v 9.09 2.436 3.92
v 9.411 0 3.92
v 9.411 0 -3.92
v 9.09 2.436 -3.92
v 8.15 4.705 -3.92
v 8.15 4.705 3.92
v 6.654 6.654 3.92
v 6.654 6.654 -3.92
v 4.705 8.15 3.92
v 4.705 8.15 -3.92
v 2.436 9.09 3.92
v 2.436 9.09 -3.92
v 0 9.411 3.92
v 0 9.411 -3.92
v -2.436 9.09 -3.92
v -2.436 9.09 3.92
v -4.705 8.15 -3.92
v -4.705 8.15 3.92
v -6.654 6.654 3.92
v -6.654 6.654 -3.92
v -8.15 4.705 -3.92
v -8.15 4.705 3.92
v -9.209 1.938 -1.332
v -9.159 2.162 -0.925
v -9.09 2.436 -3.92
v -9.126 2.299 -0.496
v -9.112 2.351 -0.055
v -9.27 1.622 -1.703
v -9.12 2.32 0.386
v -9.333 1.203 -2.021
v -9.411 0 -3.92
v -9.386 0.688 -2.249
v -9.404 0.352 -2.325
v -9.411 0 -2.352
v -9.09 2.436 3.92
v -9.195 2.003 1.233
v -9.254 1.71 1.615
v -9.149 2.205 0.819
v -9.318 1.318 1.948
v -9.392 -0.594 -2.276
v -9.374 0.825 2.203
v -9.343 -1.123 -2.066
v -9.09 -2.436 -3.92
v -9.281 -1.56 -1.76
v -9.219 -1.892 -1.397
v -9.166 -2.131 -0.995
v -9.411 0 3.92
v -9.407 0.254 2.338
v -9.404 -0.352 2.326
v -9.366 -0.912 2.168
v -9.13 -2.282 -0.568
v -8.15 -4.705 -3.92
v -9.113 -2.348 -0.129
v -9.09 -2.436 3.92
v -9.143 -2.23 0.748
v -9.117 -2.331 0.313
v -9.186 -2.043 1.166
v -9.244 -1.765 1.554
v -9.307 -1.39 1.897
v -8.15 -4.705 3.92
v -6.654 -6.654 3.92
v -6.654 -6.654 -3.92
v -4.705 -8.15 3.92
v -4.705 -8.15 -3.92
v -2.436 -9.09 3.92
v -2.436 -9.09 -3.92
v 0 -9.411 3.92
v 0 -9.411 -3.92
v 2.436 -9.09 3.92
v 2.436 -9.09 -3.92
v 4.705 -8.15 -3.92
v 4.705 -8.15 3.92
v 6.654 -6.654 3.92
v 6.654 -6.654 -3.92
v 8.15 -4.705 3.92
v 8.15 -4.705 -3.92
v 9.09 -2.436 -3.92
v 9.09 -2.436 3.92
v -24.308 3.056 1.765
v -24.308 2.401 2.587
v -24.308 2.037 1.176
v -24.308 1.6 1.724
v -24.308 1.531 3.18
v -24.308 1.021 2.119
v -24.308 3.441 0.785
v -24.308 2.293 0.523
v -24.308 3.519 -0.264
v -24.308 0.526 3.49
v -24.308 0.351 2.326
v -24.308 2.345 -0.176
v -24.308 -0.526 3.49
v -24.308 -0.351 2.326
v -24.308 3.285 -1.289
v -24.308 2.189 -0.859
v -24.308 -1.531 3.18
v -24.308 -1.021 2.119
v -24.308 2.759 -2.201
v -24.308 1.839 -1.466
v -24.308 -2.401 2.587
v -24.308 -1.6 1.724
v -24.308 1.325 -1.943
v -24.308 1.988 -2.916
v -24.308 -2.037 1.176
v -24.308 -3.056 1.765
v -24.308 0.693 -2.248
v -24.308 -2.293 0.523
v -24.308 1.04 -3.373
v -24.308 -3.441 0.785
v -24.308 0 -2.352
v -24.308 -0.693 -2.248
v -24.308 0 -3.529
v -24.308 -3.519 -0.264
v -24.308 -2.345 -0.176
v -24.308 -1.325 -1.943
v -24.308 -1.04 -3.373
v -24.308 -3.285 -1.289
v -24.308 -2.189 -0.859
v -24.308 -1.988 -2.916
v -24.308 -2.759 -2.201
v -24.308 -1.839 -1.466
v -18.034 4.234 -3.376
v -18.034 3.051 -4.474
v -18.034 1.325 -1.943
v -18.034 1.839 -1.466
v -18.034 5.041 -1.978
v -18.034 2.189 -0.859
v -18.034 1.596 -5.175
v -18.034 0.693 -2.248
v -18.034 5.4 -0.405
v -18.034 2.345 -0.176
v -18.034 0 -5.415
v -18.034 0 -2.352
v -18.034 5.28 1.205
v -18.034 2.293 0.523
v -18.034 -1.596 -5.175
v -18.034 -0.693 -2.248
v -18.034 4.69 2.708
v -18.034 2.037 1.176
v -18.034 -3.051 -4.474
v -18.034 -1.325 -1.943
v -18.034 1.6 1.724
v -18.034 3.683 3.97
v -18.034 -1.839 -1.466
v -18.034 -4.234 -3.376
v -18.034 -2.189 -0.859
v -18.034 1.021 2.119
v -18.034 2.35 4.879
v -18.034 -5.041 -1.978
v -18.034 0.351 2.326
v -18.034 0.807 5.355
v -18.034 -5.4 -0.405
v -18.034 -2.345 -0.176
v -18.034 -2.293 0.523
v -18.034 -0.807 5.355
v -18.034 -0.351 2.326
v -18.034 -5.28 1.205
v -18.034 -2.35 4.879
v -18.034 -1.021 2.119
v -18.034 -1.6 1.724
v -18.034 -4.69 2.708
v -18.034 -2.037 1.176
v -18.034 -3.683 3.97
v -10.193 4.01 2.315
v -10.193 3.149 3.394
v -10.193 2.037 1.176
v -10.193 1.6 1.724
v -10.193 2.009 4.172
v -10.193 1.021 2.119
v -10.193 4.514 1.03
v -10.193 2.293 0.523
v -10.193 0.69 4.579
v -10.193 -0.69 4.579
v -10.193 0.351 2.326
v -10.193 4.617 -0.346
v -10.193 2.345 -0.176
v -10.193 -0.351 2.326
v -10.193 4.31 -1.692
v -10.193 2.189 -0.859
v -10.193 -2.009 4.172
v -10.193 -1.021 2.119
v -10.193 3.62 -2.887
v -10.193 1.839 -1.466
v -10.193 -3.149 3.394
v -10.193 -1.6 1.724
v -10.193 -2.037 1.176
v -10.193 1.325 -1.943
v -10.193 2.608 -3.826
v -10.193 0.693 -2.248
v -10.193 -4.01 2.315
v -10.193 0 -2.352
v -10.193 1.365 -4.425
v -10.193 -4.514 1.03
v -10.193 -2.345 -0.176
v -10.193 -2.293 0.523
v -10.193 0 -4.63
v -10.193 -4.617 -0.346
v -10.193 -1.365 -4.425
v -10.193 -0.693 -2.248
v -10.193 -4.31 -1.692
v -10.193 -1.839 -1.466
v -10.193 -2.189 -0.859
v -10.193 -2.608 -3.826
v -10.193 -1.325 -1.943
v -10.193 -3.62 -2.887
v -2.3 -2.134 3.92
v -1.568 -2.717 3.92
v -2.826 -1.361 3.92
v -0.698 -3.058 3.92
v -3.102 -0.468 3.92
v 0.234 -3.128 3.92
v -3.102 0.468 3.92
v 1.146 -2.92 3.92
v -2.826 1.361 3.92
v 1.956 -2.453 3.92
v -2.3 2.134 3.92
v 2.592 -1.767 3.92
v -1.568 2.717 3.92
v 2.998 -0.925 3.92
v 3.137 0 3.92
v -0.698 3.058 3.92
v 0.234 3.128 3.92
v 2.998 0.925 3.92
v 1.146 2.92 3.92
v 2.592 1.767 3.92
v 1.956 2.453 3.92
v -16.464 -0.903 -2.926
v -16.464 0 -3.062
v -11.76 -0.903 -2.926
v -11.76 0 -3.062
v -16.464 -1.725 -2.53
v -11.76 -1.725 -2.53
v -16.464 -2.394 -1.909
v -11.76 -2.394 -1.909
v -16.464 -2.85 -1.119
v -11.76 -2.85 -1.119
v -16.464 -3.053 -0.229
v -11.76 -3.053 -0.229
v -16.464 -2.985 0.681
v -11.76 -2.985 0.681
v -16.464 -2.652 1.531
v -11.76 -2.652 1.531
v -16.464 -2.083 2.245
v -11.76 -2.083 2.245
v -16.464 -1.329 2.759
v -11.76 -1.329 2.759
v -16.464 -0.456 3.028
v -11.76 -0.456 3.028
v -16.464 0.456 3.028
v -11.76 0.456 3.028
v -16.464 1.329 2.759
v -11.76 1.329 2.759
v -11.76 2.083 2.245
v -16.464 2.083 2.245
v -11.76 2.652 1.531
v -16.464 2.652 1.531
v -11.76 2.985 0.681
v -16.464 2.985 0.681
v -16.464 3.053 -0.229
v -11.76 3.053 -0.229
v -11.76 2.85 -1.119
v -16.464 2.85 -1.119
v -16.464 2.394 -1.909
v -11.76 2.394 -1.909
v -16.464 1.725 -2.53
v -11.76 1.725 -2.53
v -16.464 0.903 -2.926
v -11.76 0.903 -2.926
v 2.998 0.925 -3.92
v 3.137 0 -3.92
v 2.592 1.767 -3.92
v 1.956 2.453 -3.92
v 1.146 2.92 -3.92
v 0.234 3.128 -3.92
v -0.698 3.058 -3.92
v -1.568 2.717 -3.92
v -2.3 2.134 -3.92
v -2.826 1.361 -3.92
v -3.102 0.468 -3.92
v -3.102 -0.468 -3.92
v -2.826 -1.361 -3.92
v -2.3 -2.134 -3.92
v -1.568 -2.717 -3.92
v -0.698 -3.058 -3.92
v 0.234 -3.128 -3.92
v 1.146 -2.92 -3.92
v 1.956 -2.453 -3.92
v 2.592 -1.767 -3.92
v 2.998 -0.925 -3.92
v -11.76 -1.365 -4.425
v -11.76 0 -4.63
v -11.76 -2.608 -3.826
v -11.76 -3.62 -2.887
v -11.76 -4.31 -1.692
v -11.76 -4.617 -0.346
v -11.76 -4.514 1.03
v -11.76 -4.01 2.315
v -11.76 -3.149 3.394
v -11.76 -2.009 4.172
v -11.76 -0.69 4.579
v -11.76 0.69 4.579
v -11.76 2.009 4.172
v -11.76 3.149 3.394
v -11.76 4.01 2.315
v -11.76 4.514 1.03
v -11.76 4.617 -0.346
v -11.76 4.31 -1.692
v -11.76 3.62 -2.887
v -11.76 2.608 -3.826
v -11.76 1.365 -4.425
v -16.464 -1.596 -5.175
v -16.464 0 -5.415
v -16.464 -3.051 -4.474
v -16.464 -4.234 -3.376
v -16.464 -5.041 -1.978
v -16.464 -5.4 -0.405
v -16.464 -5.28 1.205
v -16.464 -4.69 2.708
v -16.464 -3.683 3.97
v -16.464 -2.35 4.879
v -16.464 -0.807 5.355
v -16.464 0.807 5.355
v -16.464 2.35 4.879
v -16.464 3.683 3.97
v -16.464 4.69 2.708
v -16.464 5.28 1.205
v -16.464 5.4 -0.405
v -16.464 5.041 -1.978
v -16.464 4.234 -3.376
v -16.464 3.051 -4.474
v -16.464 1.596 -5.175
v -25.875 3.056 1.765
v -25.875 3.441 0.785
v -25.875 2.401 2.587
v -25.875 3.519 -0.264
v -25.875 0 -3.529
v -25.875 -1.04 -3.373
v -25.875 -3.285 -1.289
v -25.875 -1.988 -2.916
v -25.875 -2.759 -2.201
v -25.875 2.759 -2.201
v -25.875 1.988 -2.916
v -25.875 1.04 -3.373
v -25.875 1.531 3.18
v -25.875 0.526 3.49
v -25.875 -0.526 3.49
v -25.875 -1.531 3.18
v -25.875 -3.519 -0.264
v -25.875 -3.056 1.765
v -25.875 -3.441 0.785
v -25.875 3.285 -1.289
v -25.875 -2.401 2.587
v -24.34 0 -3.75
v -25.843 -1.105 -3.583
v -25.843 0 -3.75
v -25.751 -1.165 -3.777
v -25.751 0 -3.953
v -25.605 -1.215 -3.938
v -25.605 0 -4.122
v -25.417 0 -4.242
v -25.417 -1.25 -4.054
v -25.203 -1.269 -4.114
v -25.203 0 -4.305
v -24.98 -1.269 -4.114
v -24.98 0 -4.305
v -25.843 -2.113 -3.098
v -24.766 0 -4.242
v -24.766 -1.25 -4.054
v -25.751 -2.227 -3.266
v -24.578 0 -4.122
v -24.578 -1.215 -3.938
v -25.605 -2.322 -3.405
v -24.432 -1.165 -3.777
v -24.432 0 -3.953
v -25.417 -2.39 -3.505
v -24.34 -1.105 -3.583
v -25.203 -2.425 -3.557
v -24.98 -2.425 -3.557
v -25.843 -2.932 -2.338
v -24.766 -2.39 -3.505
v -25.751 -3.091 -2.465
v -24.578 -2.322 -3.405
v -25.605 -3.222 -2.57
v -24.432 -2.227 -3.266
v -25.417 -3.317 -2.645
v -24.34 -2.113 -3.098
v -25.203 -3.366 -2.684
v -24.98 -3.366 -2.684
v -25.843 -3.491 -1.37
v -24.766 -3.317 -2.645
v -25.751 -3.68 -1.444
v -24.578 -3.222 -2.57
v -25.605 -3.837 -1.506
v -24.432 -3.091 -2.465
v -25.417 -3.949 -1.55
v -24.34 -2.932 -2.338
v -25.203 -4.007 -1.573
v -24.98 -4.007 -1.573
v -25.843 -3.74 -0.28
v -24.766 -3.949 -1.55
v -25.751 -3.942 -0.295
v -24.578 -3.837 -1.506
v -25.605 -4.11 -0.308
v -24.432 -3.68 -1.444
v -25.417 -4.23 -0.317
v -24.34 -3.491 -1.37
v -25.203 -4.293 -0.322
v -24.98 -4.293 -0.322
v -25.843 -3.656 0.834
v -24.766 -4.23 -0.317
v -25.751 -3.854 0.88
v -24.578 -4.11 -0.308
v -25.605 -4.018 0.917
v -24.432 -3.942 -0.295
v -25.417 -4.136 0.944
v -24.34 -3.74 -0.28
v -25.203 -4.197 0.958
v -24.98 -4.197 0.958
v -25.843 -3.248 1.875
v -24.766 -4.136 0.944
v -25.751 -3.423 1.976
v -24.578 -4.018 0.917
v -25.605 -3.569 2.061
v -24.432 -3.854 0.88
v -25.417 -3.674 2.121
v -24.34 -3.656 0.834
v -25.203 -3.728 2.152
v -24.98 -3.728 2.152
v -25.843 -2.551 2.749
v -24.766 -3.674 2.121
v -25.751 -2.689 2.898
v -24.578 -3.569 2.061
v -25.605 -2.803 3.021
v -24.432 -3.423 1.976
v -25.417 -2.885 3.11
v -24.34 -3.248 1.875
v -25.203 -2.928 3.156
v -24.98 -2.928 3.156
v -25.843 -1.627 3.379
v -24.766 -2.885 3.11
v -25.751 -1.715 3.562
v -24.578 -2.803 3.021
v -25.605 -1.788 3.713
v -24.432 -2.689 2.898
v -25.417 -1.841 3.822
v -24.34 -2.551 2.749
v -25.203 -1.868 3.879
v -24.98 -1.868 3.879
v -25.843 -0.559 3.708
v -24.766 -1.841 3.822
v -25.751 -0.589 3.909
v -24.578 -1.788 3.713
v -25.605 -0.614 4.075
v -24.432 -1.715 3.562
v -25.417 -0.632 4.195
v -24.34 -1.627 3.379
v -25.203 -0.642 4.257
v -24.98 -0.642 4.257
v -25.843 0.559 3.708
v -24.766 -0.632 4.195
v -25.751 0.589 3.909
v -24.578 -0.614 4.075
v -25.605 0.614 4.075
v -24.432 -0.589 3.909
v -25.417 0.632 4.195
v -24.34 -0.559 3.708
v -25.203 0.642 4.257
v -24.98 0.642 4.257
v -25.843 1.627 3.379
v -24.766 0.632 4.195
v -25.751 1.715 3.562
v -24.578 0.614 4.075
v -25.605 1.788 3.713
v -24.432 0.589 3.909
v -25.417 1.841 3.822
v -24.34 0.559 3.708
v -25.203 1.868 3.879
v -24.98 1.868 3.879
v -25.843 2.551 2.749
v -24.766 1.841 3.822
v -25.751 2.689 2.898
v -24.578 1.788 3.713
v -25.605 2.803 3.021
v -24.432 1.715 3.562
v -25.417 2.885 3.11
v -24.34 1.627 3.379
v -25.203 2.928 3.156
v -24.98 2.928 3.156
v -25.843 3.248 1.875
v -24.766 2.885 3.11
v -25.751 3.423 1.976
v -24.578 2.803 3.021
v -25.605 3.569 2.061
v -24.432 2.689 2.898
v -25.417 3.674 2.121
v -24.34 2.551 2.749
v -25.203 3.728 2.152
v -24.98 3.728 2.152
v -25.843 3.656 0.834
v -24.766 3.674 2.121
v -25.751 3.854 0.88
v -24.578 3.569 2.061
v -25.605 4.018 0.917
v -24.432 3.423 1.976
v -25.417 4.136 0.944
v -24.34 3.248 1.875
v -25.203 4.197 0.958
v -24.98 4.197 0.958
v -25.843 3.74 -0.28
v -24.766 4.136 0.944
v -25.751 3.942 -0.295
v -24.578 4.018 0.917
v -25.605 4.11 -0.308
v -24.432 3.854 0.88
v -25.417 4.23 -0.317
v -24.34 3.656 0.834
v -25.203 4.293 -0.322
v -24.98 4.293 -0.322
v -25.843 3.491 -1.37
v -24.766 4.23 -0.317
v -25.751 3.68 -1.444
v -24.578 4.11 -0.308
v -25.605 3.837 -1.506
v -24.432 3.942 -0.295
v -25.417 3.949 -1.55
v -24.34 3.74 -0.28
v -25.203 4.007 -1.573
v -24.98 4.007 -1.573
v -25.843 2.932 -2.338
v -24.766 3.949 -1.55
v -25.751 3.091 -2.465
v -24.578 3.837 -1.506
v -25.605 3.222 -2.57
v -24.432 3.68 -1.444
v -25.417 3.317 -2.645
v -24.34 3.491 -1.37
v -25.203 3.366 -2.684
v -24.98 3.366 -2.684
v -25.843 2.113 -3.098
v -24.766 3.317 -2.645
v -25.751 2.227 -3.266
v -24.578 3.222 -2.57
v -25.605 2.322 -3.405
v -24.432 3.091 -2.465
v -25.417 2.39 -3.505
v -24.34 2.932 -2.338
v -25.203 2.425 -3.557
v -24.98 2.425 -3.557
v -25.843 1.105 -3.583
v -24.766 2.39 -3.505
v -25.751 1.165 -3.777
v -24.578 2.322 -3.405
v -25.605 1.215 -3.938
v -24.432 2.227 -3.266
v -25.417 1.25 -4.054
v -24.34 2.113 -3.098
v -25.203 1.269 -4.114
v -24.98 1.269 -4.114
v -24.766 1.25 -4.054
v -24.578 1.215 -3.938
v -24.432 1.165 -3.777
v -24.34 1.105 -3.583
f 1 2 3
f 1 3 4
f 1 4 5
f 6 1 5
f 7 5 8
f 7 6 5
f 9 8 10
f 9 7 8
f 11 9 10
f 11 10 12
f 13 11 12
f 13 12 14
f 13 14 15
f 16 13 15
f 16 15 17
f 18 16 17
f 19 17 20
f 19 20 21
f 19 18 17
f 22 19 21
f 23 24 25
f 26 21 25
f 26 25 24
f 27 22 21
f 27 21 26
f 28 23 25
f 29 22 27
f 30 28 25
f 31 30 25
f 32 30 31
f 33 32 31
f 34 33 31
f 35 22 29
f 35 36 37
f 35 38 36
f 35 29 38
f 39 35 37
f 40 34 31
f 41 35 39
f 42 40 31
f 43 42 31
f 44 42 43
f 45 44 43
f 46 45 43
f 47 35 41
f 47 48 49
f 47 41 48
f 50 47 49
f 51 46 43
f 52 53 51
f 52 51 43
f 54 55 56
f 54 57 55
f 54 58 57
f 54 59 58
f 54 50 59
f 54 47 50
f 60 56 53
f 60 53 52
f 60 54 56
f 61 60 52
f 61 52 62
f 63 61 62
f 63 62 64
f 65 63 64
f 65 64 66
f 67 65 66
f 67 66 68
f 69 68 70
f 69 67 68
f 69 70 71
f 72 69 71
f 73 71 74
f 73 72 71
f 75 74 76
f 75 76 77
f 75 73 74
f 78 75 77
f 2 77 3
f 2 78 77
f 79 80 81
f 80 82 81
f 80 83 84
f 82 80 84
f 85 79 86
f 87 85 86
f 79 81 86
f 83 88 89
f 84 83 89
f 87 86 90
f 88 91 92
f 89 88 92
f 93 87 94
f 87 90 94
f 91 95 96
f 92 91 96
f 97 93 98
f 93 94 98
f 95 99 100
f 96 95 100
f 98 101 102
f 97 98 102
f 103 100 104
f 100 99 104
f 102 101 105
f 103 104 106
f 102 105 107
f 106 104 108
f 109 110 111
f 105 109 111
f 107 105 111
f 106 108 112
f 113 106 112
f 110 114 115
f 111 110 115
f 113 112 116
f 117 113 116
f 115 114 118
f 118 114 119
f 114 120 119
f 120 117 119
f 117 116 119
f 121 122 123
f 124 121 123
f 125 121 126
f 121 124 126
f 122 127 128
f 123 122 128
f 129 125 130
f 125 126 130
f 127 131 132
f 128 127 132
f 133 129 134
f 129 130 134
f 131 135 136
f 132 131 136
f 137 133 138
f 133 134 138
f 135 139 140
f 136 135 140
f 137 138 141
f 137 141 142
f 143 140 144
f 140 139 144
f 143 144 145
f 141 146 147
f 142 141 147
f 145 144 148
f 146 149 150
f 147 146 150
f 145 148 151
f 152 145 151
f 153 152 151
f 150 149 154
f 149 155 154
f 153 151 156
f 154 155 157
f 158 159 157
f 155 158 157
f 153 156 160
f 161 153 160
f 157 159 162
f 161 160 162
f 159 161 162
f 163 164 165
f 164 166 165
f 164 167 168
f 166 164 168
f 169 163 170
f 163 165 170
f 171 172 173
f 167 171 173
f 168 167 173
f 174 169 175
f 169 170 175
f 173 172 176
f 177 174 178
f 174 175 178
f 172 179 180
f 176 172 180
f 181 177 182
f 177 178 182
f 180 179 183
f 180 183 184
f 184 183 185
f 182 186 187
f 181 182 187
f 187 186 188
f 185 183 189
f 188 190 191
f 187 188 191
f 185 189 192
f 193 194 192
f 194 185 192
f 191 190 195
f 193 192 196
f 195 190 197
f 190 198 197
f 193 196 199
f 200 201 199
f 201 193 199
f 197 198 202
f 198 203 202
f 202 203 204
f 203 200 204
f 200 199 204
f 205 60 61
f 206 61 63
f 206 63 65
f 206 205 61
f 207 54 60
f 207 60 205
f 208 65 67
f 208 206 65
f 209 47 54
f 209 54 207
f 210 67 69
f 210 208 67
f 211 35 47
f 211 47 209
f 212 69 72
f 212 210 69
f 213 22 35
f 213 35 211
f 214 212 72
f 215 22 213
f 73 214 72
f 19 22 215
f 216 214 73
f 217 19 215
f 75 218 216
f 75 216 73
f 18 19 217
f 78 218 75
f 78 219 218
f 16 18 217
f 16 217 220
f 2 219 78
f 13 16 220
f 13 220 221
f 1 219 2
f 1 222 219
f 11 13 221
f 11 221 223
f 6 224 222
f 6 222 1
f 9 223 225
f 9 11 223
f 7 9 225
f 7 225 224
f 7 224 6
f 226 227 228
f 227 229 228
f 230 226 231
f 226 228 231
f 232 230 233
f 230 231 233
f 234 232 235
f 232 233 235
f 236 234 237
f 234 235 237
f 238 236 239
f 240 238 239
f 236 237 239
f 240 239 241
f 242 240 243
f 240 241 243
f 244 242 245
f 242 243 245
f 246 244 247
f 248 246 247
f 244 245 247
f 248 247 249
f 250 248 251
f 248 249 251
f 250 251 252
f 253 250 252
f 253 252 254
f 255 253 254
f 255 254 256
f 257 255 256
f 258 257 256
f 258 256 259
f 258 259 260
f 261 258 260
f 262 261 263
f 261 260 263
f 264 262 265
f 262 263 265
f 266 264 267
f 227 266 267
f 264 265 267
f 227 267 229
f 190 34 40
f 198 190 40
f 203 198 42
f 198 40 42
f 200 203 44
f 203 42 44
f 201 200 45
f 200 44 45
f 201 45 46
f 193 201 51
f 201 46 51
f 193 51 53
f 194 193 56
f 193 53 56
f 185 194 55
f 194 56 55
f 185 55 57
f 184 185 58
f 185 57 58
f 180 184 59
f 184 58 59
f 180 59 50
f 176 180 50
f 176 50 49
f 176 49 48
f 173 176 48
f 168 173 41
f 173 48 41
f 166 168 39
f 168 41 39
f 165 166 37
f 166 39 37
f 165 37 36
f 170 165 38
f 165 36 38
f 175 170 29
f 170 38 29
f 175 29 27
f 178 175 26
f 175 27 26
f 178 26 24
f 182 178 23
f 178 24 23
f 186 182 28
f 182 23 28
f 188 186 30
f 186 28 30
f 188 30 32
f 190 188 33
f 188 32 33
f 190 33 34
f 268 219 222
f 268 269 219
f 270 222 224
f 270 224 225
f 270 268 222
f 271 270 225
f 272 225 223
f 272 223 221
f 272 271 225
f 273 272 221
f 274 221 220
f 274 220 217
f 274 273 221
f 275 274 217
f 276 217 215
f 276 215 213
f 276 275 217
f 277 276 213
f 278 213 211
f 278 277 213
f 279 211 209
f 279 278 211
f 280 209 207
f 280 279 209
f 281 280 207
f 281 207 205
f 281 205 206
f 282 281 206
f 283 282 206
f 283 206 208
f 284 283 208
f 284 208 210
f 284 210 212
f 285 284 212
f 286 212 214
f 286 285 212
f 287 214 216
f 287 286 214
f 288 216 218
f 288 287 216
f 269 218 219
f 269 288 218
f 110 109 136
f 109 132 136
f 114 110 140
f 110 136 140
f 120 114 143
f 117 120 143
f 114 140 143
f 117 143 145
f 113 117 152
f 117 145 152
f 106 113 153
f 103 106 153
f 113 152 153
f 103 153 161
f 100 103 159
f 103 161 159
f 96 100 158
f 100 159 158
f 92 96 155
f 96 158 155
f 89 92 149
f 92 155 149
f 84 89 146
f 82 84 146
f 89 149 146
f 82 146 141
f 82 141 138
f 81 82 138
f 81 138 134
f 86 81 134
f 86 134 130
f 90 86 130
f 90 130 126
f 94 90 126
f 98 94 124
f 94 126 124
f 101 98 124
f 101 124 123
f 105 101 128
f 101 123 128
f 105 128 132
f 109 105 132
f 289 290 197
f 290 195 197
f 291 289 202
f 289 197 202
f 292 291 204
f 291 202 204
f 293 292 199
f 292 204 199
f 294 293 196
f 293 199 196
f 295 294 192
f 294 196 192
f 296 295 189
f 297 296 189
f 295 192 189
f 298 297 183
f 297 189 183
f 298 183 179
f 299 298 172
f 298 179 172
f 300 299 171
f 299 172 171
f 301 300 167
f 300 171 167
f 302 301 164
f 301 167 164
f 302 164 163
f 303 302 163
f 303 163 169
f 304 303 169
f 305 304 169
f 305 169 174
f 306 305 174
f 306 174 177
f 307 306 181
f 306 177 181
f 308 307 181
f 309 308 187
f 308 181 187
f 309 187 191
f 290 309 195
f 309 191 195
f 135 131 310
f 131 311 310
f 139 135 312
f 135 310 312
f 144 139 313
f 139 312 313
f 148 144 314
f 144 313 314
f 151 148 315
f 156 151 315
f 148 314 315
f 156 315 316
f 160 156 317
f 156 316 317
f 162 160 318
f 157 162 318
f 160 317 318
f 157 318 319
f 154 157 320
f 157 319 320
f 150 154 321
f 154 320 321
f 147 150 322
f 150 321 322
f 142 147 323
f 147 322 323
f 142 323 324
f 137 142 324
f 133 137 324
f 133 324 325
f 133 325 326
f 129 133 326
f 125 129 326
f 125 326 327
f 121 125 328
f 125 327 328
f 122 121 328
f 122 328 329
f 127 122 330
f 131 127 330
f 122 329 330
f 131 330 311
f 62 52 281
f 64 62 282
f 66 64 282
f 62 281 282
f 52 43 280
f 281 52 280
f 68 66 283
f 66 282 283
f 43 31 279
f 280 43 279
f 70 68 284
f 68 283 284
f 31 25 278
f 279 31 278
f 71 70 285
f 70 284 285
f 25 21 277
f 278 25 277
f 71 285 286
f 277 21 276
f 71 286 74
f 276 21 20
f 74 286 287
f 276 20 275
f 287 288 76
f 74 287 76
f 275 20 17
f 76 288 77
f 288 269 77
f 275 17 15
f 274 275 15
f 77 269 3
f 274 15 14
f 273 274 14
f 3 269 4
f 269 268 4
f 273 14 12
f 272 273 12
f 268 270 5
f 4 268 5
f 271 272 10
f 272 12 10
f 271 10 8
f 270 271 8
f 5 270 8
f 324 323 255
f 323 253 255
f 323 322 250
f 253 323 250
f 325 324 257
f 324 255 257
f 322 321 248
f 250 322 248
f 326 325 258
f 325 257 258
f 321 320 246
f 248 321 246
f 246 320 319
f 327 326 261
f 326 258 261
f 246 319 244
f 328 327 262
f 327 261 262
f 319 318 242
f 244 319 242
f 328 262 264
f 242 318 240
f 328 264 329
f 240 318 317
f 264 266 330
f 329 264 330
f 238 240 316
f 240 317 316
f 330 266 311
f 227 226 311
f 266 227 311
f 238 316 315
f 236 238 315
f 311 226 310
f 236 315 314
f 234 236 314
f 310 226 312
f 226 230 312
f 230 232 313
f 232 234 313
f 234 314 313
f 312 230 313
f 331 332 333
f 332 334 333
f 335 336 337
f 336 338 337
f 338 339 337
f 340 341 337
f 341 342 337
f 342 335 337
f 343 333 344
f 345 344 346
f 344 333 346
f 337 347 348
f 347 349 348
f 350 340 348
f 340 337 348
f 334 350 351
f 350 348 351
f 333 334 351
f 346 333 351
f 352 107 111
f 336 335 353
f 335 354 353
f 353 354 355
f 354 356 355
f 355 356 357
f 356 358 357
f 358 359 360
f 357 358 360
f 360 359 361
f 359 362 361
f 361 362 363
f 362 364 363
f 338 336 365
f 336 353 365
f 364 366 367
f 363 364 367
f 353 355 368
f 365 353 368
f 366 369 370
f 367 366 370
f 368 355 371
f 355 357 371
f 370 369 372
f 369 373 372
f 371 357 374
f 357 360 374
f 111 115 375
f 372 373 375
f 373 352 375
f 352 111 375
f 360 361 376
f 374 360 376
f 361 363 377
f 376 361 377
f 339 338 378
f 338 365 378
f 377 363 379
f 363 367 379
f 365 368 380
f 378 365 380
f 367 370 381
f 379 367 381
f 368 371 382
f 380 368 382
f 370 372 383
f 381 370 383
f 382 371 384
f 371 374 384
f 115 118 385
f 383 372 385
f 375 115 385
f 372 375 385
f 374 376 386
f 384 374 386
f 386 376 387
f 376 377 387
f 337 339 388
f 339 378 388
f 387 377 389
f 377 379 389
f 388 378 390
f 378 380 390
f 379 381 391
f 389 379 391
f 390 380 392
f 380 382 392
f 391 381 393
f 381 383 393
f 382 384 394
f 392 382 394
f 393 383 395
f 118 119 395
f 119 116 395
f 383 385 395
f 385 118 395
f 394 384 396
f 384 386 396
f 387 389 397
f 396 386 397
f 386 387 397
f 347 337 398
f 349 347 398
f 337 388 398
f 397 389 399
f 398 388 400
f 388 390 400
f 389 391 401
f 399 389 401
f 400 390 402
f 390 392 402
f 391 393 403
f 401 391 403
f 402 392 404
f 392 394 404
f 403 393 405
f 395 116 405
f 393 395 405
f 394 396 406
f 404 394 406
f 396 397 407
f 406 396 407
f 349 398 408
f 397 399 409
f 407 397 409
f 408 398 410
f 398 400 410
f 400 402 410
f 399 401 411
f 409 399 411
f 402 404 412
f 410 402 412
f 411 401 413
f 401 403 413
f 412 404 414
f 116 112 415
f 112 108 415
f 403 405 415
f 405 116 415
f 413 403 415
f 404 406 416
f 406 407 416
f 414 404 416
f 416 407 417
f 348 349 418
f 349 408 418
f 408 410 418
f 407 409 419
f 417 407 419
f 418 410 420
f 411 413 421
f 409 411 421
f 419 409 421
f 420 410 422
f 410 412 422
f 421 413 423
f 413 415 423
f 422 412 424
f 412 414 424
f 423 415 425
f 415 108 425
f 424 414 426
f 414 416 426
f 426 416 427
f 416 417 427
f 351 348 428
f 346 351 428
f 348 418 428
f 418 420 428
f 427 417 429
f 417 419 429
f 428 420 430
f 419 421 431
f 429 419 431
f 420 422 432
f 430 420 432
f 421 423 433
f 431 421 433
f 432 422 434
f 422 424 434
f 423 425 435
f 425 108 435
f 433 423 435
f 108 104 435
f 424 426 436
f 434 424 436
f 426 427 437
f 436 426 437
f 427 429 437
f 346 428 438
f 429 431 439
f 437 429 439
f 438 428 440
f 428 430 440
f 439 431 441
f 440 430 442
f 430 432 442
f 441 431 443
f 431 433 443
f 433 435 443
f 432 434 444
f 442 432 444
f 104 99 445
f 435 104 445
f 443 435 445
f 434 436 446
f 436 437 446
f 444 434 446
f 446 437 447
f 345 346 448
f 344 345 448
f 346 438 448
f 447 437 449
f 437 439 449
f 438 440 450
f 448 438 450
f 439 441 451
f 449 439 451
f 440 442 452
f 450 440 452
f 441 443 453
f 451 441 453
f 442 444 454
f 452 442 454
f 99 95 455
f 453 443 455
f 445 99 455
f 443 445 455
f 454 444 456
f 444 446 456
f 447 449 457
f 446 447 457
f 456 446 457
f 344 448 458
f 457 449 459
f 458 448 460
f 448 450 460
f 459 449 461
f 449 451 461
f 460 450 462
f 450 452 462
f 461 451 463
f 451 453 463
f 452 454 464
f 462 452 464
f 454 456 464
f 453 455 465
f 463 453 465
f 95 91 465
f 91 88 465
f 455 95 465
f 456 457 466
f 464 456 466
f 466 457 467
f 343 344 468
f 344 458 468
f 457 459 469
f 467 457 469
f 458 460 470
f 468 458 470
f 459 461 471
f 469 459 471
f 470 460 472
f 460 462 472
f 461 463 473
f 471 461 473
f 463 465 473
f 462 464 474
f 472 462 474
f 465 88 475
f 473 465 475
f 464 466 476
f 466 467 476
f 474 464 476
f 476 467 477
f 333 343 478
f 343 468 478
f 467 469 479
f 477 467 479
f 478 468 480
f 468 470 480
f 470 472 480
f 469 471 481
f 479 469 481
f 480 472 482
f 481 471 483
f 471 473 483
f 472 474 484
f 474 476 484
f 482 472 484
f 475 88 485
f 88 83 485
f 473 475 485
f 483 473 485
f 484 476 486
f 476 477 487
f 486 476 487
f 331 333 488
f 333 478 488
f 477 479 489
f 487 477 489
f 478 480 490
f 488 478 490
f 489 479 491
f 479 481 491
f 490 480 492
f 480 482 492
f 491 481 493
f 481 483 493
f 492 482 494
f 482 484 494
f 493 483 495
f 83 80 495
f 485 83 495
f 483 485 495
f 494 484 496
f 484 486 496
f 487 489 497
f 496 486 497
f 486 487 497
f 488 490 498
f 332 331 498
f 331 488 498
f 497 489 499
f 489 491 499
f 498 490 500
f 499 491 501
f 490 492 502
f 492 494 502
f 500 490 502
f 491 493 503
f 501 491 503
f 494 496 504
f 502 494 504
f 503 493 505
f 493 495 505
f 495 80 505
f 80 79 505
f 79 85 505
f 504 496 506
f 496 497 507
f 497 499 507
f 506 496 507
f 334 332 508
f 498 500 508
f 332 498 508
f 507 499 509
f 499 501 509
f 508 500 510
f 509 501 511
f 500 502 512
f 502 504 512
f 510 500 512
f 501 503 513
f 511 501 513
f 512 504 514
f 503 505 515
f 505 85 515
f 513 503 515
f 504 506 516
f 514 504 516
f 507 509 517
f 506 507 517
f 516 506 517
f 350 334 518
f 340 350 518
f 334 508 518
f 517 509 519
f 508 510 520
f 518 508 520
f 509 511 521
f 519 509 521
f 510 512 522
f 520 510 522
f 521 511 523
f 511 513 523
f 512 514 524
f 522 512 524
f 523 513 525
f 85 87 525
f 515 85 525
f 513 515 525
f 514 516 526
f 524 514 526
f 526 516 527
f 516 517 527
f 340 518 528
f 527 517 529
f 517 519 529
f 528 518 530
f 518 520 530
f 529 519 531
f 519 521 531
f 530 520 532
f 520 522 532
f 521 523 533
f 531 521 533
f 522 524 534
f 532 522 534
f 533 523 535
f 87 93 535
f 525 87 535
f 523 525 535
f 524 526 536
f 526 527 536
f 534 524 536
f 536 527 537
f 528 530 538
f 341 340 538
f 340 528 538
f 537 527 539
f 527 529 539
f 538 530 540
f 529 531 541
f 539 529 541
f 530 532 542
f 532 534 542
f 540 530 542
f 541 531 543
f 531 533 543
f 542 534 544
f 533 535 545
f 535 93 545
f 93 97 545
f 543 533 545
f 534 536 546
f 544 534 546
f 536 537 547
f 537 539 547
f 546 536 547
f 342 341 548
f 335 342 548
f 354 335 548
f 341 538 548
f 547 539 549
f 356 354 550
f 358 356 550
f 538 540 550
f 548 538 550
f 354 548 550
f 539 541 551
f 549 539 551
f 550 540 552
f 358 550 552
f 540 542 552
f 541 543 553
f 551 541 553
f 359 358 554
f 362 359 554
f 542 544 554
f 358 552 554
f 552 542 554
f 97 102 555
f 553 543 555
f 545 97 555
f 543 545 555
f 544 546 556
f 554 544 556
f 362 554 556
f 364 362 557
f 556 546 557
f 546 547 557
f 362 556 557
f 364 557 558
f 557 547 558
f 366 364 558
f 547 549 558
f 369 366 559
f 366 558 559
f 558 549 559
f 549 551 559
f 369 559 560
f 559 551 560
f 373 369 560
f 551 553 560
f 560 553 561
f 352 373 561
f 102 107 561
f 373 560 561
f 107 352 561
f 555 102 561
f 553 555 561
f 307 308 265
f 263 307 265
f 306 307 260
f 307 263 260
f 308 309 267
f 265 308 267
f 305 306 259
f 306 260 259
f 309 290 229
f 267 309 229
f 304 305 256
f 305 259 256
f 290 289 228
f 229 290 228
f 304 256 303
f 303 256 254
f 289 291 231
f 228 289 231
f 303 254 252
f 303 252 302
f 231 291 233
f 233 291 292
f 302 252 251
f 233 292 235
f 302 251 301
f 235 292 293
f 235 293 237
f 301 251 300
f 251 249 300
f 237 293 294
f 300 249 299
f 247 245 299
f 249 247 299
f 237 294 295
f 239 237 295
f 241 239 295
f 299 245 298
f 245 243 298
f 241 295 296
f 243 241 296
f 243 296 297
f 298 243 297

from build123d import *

# Parameters (mm, degrees)
SKETCH1_R                = 9.4107
SKETCH1_R_2              = 3.1369
BOSS_EXTRUDE1_DEPTH      = 3.92049
BOSS_EXTRUDE1_DEPTH_BACK = 3.92049


with BuildPart() as part:
    # Sketch1 → Boss-Extrude1 (new body, two sides)
    with BuildSketch(Plane.XY) as boss_extrude1_sk:
        Circle(SKETCH1_R)
        Circle(SKETCH1_R_2, mode=Mode.SUBTRACT)
    extrude(amount=BOSS_EXTRUDE1_DEPTH)
    extrude(boss_extrude1_sk.sketch, amount=-BOSS_EXTRUDE1_DEPTH_BACK)

    # Sketch2 → Revolve1 (revolve)
    with BuildSketch(Plane(origin=(0, 0, 0), x_dir=(1, 0, 0), z_dir=(0, 1, 0))):
        with BuildLine():
            Line((-5.959188984, 0), (-25.87498, 0))
            Line((-25.87498, 0), (-25.87498, 3.52933))
            ThreePointArc((-25.87498, 3.52933), (-25.09139, 4.31292), (-24.3078, 3.52933))
            Line((-24.3078, 3.52933), (-24.3078, 2.35204))
            Line((-24.3078, 2.35204), (-18.034, 2.35204))
            Line((-18.034, 2.35204), (-18.034, 5.41528))
            Line((-18.034, 5.41528), (-16.46428, 5.41528))
            Line((-16.46428, 5.41528), (-16.46428, 3.06197))
            Line((-16.46428, 3.06197), (-11.7602, 3.06197))
            Line((-11.7602, 3.06197), (-11.7602, 4.63042))
            Line((-11.7602, 4.63042), (-10.19302, 4.63042))
            Line((-10.19302, 4.63042), (-10.19302, 2.35204))
            Line((-10.19302, 2.35204), (-5.959188984, 2.35204))
            Line((-5.959188984, 2.35204), (-5.959188984, 0))
        make_face()
    revolve(axis=Axis((-5.959188984, 0, 0), (-1, 0, 0)))


solid = part.part
